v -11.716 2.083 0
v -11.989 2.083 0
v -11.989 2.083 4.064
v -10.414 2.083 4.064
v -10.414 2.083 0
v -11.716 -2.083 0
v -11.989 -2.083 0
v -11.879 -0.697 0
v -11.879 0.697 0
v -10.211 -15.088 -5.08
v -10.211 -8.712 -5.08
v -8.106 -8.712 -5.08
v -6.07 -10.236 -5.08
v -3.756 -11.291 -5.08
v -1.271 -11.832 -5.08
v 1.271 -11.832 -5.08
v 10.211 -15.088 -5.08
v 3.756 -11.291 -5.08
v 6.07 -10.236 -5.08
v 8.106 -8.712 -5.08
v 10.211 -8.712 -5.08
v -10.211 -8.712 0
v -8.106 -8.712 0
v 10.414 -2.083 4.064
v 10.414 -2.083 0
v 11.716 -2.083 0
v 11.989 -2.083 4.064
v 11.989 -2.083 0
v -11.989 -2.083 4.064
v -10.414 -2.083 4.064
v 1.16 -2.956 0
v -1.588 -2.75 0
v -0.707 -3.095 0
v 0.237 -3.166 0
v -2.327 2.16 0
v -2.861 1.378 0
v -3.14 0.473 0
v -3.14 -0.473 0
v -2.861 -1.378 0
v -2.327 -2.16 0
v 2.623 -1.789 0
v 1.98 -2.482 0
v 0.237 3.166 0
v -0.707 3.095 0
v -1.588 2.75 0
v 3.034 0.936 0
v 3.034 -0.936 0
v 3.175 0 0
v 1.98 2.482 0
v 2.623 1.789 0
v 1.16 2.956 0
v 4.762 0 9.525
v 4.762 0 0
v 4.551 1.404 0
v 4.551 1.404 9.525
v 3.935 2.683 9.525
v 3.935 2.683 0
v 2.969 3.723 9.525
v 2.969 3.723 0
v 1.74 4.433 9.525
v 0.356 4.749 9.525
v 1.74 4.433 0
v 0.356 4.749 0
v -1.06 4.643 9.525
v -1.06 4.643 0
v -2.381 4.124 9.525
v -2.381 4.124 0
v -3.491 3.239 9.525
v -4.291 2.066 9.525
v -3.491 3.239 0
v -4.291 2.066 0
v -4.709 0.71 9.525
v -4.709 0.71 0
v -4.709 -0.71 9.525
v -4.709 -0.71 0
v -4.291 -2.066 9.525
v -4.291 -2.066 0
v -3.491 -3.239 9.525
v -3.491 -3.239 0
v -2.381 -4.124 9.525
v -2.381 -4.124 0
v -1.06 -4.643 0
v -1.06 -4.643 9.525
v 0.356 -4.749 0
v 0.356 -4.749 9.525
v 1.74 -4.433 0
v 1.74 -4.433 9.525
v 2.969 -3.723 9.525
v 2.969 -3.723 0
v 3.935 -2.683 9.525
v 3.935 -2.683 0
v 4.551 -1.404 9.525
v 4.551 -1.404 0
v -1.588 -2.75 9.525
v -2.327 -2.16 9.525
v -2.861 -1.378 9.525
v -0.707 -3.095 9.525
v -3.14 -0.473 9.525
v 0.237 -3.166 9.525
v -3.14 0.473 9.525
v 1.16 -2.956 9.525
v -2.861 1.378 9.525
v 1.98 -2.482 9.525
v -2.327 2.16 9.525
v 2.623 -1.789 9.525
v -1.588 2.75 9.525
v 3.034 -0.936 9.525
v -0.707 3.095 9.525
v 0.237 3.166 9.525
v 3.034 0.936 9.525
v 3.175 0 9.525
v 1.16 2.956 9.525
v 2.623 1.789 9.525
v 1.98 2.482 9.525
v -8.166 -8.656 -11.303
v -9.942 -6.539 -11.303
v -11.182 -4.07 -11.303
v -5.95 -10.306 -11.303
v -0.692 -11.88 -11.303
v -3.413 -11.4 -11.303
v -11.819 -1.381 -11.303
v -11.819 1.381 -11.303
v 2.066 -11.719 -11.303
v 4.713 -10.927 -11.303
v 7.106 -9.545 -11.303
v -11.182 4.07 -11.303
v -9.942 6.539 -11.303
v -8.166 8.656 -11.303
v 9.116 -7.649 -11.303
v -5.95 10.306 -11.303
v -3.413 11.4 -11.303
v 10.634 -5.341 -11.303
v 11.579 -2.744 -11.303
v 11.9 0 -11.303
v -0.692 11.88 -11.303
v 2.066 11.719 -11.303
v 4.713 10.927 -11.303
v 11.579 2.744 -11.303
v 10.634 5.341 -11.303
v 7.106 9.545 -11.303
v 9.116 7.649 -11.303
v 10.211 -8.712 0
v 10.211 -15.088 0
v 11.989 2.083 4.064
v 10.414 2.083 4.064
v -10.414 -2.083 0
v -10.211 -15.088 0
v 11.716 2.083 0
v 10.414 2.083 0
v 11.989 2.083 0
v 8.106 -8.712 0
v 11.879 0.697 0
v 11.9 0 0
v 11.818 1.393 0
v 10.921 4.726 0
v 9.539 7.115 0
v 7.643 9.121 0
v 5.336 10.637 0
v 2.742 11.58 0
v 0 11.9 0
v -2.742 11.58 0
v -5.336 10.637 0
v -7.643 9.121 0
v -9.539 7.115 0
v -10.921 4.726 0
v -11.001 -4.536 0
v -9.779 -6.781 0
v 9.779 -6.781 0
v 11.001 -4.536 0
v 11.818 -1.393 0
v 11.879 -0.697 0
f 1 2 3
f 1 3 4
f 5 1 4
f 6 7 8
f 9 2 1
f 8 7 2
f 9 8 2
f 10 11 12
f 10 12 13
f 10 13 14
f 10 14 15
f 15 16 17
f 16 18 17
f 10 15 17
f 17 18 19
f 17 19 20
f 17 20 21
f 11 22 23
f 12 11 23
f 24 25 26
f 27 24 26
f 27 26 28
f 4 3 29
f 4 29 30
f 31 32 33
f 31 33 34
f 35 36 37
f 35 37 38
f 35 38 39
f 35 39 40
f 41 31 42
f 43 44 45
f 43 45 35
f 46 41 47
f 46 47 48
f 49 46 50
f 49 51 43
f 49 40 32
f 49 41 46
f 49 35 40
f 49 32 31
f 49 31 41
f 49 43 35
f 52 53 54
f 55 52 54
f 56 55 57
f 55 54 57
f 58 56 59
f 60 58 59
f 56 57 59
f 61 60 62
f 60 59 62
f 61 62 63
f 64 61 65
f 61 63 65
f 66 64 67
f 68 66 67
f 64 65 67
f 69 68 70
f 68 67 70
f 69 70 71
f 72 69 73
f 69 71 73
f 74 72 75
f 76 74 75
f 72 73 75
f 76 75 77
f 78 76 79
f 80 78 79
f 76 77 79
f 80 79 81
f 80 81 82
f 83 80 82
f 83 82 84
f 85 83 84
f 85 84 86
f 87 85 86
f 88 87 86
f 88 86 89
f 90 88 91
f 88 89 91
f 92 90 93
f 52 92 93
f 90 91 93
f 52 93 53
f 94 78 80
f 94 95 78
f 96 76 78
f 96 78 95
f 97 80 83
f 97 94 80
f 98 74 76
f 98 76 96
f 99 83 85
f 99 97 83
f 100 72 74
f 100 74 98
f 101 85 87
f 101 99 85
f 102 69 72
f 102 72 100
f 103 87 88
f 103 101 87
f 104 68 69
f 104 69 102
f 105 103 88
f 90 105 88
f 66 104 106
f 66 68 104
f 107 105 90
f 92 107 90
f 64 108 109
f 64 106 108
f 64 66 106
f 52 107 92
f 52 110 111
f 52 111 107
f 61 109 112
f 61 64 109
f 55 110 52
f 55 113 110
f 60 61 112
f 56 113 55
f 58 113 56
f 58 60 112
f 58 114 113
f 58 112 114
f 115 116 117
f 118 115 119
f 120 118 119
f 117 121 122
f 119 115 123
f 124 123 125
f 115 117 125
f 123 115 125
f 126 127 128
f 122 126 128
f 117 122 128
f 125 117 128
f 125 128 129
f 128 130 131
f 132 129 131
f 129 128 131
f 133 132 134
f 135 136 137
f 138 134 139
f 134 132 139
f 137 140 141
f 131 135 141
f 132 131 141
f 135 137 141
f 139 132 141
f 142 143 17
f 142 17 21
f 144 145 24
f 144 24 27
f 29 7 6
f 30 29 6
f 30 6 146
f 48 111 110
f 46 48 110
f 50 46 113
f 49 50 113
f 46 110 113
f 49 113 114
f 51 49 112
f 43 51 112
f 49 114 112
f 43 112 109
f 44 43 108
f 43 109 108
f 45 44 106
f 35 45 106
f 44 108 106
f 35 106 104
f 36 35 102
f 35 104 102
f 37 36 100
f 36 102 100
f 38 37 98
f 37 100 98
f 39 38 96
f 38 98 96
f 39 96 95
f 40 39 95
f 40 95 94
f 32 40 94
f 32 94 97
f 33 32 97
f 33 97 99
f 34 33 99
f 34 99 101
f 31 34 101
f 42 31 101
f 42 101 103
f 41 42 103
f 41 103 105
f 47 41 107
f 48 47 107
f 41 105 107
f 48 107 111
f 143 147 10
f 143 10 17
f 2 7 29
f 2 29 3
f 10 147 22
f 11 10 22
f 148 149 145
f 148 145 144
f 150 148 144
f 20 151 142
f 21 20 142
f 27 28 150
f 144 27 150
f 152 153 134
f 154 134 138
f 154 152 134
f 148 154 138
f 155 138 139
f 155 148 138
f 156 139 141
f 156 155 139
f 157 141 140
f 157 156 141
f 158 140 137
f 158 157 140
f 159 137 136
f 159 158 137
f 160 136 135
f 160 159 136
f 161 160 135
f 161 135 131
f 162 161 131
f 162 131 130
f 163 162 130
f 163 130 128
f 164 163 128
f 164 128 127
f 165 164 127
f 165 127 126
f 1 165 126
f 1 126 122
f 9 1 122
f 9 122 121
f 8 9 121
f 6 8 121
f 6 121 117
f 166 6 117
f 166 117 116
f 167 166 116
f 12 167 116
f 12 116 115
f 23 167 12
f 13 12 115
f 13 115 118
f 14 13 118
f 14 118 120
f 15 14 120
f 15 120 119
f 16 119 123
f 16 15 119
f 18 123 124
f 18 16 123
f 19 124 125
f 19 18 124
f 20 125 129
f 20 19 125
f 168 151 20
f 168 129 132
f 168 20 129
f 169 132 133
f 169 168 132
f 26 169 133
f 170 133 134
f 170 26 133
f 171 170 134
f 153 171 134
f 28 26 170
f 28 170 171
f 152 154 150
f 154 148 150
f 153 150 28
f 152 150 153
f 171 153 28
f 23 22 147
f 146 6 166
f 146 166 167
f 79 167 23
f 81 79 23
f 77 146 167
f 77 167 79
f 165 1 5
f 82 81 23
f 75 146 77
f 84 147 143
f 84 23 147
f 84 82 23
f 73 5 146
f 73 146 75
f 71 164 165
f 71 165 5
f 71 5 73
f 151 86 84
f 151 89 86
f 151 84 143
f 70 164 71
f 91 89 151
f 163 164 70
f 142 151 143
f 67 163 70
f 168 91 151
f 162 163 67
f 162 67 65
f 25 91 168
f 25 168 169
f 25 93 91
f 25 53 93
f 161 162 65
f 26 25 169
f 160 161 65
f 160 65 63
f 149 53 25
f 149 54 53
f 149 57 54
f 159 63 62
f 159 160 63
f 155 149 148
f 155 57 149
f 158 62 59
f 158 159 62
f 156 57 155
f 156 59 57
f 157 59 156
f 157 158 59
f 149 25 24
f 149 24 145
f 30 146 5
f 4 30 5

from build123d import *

# Parameters (mm, degrees)
SKETCH1_R          = 11.8999
BODY_DEPTH         = 11.303
SKETCH2_R          = 4.7625
BUSHING_DEPTH      = 9.525
SKETCH3_W          = 1.5748
SKETCH3_H          = 4.1656
MOUNT_TAB_DEPTH    = 4.064
SKETCH4_R          = 3.175
CUT_EXTRUDE1_DEPTH = 9.525
SKETCH5_W          = 20.4216
SKETCH5_H          = 6.3754
BOARD_DEPTH        = 5.08


with BuildPart() as part:
    # Sketch1 → Body (new body)
    with BuildSketch(Plane.XY):
        Circle(SKETCH1_R)
    extrude(amount=-BODY_DEPTH)

    # Sketch2 → bushing (add)
    with BuildSketch(Plane.XY):
        Circle(SKETCH2_R)
    extrude(amount=BUSHING_DEPTH)

    # Sketch3 → mount tab (add)
    with BuildSketch(Plane.XY):
        with Locations((-11.2014, 0)):
            Rectangle(SKETCH3_W, SKETCH3_H)
        with Locations((11.2014, 0)):
            Rectangle(SKETCH3_W, SKETCH3_H)
    extrude(amount=MOUNT_TAB_DEPTH)

    # Sketch4 → Cut-Extrude1 (cut)
    with BuildSketch(Plane.XY.offset(9.525)):
        Circle(SKETCH4_R)
    extrude(amount=-CUT_EXTRUDE1_DEPTH, mode=Mode.SUBTRACT)

    # Sketch5 → board (add)
    with BuildSketch(Plane.XY):
        with Locations((0, -11.8999)):
            Rectangle(SKETCH5_W, SKETCH5_H)
    extrude(amount=-BOARD_DEPTH)


solid = part.part
